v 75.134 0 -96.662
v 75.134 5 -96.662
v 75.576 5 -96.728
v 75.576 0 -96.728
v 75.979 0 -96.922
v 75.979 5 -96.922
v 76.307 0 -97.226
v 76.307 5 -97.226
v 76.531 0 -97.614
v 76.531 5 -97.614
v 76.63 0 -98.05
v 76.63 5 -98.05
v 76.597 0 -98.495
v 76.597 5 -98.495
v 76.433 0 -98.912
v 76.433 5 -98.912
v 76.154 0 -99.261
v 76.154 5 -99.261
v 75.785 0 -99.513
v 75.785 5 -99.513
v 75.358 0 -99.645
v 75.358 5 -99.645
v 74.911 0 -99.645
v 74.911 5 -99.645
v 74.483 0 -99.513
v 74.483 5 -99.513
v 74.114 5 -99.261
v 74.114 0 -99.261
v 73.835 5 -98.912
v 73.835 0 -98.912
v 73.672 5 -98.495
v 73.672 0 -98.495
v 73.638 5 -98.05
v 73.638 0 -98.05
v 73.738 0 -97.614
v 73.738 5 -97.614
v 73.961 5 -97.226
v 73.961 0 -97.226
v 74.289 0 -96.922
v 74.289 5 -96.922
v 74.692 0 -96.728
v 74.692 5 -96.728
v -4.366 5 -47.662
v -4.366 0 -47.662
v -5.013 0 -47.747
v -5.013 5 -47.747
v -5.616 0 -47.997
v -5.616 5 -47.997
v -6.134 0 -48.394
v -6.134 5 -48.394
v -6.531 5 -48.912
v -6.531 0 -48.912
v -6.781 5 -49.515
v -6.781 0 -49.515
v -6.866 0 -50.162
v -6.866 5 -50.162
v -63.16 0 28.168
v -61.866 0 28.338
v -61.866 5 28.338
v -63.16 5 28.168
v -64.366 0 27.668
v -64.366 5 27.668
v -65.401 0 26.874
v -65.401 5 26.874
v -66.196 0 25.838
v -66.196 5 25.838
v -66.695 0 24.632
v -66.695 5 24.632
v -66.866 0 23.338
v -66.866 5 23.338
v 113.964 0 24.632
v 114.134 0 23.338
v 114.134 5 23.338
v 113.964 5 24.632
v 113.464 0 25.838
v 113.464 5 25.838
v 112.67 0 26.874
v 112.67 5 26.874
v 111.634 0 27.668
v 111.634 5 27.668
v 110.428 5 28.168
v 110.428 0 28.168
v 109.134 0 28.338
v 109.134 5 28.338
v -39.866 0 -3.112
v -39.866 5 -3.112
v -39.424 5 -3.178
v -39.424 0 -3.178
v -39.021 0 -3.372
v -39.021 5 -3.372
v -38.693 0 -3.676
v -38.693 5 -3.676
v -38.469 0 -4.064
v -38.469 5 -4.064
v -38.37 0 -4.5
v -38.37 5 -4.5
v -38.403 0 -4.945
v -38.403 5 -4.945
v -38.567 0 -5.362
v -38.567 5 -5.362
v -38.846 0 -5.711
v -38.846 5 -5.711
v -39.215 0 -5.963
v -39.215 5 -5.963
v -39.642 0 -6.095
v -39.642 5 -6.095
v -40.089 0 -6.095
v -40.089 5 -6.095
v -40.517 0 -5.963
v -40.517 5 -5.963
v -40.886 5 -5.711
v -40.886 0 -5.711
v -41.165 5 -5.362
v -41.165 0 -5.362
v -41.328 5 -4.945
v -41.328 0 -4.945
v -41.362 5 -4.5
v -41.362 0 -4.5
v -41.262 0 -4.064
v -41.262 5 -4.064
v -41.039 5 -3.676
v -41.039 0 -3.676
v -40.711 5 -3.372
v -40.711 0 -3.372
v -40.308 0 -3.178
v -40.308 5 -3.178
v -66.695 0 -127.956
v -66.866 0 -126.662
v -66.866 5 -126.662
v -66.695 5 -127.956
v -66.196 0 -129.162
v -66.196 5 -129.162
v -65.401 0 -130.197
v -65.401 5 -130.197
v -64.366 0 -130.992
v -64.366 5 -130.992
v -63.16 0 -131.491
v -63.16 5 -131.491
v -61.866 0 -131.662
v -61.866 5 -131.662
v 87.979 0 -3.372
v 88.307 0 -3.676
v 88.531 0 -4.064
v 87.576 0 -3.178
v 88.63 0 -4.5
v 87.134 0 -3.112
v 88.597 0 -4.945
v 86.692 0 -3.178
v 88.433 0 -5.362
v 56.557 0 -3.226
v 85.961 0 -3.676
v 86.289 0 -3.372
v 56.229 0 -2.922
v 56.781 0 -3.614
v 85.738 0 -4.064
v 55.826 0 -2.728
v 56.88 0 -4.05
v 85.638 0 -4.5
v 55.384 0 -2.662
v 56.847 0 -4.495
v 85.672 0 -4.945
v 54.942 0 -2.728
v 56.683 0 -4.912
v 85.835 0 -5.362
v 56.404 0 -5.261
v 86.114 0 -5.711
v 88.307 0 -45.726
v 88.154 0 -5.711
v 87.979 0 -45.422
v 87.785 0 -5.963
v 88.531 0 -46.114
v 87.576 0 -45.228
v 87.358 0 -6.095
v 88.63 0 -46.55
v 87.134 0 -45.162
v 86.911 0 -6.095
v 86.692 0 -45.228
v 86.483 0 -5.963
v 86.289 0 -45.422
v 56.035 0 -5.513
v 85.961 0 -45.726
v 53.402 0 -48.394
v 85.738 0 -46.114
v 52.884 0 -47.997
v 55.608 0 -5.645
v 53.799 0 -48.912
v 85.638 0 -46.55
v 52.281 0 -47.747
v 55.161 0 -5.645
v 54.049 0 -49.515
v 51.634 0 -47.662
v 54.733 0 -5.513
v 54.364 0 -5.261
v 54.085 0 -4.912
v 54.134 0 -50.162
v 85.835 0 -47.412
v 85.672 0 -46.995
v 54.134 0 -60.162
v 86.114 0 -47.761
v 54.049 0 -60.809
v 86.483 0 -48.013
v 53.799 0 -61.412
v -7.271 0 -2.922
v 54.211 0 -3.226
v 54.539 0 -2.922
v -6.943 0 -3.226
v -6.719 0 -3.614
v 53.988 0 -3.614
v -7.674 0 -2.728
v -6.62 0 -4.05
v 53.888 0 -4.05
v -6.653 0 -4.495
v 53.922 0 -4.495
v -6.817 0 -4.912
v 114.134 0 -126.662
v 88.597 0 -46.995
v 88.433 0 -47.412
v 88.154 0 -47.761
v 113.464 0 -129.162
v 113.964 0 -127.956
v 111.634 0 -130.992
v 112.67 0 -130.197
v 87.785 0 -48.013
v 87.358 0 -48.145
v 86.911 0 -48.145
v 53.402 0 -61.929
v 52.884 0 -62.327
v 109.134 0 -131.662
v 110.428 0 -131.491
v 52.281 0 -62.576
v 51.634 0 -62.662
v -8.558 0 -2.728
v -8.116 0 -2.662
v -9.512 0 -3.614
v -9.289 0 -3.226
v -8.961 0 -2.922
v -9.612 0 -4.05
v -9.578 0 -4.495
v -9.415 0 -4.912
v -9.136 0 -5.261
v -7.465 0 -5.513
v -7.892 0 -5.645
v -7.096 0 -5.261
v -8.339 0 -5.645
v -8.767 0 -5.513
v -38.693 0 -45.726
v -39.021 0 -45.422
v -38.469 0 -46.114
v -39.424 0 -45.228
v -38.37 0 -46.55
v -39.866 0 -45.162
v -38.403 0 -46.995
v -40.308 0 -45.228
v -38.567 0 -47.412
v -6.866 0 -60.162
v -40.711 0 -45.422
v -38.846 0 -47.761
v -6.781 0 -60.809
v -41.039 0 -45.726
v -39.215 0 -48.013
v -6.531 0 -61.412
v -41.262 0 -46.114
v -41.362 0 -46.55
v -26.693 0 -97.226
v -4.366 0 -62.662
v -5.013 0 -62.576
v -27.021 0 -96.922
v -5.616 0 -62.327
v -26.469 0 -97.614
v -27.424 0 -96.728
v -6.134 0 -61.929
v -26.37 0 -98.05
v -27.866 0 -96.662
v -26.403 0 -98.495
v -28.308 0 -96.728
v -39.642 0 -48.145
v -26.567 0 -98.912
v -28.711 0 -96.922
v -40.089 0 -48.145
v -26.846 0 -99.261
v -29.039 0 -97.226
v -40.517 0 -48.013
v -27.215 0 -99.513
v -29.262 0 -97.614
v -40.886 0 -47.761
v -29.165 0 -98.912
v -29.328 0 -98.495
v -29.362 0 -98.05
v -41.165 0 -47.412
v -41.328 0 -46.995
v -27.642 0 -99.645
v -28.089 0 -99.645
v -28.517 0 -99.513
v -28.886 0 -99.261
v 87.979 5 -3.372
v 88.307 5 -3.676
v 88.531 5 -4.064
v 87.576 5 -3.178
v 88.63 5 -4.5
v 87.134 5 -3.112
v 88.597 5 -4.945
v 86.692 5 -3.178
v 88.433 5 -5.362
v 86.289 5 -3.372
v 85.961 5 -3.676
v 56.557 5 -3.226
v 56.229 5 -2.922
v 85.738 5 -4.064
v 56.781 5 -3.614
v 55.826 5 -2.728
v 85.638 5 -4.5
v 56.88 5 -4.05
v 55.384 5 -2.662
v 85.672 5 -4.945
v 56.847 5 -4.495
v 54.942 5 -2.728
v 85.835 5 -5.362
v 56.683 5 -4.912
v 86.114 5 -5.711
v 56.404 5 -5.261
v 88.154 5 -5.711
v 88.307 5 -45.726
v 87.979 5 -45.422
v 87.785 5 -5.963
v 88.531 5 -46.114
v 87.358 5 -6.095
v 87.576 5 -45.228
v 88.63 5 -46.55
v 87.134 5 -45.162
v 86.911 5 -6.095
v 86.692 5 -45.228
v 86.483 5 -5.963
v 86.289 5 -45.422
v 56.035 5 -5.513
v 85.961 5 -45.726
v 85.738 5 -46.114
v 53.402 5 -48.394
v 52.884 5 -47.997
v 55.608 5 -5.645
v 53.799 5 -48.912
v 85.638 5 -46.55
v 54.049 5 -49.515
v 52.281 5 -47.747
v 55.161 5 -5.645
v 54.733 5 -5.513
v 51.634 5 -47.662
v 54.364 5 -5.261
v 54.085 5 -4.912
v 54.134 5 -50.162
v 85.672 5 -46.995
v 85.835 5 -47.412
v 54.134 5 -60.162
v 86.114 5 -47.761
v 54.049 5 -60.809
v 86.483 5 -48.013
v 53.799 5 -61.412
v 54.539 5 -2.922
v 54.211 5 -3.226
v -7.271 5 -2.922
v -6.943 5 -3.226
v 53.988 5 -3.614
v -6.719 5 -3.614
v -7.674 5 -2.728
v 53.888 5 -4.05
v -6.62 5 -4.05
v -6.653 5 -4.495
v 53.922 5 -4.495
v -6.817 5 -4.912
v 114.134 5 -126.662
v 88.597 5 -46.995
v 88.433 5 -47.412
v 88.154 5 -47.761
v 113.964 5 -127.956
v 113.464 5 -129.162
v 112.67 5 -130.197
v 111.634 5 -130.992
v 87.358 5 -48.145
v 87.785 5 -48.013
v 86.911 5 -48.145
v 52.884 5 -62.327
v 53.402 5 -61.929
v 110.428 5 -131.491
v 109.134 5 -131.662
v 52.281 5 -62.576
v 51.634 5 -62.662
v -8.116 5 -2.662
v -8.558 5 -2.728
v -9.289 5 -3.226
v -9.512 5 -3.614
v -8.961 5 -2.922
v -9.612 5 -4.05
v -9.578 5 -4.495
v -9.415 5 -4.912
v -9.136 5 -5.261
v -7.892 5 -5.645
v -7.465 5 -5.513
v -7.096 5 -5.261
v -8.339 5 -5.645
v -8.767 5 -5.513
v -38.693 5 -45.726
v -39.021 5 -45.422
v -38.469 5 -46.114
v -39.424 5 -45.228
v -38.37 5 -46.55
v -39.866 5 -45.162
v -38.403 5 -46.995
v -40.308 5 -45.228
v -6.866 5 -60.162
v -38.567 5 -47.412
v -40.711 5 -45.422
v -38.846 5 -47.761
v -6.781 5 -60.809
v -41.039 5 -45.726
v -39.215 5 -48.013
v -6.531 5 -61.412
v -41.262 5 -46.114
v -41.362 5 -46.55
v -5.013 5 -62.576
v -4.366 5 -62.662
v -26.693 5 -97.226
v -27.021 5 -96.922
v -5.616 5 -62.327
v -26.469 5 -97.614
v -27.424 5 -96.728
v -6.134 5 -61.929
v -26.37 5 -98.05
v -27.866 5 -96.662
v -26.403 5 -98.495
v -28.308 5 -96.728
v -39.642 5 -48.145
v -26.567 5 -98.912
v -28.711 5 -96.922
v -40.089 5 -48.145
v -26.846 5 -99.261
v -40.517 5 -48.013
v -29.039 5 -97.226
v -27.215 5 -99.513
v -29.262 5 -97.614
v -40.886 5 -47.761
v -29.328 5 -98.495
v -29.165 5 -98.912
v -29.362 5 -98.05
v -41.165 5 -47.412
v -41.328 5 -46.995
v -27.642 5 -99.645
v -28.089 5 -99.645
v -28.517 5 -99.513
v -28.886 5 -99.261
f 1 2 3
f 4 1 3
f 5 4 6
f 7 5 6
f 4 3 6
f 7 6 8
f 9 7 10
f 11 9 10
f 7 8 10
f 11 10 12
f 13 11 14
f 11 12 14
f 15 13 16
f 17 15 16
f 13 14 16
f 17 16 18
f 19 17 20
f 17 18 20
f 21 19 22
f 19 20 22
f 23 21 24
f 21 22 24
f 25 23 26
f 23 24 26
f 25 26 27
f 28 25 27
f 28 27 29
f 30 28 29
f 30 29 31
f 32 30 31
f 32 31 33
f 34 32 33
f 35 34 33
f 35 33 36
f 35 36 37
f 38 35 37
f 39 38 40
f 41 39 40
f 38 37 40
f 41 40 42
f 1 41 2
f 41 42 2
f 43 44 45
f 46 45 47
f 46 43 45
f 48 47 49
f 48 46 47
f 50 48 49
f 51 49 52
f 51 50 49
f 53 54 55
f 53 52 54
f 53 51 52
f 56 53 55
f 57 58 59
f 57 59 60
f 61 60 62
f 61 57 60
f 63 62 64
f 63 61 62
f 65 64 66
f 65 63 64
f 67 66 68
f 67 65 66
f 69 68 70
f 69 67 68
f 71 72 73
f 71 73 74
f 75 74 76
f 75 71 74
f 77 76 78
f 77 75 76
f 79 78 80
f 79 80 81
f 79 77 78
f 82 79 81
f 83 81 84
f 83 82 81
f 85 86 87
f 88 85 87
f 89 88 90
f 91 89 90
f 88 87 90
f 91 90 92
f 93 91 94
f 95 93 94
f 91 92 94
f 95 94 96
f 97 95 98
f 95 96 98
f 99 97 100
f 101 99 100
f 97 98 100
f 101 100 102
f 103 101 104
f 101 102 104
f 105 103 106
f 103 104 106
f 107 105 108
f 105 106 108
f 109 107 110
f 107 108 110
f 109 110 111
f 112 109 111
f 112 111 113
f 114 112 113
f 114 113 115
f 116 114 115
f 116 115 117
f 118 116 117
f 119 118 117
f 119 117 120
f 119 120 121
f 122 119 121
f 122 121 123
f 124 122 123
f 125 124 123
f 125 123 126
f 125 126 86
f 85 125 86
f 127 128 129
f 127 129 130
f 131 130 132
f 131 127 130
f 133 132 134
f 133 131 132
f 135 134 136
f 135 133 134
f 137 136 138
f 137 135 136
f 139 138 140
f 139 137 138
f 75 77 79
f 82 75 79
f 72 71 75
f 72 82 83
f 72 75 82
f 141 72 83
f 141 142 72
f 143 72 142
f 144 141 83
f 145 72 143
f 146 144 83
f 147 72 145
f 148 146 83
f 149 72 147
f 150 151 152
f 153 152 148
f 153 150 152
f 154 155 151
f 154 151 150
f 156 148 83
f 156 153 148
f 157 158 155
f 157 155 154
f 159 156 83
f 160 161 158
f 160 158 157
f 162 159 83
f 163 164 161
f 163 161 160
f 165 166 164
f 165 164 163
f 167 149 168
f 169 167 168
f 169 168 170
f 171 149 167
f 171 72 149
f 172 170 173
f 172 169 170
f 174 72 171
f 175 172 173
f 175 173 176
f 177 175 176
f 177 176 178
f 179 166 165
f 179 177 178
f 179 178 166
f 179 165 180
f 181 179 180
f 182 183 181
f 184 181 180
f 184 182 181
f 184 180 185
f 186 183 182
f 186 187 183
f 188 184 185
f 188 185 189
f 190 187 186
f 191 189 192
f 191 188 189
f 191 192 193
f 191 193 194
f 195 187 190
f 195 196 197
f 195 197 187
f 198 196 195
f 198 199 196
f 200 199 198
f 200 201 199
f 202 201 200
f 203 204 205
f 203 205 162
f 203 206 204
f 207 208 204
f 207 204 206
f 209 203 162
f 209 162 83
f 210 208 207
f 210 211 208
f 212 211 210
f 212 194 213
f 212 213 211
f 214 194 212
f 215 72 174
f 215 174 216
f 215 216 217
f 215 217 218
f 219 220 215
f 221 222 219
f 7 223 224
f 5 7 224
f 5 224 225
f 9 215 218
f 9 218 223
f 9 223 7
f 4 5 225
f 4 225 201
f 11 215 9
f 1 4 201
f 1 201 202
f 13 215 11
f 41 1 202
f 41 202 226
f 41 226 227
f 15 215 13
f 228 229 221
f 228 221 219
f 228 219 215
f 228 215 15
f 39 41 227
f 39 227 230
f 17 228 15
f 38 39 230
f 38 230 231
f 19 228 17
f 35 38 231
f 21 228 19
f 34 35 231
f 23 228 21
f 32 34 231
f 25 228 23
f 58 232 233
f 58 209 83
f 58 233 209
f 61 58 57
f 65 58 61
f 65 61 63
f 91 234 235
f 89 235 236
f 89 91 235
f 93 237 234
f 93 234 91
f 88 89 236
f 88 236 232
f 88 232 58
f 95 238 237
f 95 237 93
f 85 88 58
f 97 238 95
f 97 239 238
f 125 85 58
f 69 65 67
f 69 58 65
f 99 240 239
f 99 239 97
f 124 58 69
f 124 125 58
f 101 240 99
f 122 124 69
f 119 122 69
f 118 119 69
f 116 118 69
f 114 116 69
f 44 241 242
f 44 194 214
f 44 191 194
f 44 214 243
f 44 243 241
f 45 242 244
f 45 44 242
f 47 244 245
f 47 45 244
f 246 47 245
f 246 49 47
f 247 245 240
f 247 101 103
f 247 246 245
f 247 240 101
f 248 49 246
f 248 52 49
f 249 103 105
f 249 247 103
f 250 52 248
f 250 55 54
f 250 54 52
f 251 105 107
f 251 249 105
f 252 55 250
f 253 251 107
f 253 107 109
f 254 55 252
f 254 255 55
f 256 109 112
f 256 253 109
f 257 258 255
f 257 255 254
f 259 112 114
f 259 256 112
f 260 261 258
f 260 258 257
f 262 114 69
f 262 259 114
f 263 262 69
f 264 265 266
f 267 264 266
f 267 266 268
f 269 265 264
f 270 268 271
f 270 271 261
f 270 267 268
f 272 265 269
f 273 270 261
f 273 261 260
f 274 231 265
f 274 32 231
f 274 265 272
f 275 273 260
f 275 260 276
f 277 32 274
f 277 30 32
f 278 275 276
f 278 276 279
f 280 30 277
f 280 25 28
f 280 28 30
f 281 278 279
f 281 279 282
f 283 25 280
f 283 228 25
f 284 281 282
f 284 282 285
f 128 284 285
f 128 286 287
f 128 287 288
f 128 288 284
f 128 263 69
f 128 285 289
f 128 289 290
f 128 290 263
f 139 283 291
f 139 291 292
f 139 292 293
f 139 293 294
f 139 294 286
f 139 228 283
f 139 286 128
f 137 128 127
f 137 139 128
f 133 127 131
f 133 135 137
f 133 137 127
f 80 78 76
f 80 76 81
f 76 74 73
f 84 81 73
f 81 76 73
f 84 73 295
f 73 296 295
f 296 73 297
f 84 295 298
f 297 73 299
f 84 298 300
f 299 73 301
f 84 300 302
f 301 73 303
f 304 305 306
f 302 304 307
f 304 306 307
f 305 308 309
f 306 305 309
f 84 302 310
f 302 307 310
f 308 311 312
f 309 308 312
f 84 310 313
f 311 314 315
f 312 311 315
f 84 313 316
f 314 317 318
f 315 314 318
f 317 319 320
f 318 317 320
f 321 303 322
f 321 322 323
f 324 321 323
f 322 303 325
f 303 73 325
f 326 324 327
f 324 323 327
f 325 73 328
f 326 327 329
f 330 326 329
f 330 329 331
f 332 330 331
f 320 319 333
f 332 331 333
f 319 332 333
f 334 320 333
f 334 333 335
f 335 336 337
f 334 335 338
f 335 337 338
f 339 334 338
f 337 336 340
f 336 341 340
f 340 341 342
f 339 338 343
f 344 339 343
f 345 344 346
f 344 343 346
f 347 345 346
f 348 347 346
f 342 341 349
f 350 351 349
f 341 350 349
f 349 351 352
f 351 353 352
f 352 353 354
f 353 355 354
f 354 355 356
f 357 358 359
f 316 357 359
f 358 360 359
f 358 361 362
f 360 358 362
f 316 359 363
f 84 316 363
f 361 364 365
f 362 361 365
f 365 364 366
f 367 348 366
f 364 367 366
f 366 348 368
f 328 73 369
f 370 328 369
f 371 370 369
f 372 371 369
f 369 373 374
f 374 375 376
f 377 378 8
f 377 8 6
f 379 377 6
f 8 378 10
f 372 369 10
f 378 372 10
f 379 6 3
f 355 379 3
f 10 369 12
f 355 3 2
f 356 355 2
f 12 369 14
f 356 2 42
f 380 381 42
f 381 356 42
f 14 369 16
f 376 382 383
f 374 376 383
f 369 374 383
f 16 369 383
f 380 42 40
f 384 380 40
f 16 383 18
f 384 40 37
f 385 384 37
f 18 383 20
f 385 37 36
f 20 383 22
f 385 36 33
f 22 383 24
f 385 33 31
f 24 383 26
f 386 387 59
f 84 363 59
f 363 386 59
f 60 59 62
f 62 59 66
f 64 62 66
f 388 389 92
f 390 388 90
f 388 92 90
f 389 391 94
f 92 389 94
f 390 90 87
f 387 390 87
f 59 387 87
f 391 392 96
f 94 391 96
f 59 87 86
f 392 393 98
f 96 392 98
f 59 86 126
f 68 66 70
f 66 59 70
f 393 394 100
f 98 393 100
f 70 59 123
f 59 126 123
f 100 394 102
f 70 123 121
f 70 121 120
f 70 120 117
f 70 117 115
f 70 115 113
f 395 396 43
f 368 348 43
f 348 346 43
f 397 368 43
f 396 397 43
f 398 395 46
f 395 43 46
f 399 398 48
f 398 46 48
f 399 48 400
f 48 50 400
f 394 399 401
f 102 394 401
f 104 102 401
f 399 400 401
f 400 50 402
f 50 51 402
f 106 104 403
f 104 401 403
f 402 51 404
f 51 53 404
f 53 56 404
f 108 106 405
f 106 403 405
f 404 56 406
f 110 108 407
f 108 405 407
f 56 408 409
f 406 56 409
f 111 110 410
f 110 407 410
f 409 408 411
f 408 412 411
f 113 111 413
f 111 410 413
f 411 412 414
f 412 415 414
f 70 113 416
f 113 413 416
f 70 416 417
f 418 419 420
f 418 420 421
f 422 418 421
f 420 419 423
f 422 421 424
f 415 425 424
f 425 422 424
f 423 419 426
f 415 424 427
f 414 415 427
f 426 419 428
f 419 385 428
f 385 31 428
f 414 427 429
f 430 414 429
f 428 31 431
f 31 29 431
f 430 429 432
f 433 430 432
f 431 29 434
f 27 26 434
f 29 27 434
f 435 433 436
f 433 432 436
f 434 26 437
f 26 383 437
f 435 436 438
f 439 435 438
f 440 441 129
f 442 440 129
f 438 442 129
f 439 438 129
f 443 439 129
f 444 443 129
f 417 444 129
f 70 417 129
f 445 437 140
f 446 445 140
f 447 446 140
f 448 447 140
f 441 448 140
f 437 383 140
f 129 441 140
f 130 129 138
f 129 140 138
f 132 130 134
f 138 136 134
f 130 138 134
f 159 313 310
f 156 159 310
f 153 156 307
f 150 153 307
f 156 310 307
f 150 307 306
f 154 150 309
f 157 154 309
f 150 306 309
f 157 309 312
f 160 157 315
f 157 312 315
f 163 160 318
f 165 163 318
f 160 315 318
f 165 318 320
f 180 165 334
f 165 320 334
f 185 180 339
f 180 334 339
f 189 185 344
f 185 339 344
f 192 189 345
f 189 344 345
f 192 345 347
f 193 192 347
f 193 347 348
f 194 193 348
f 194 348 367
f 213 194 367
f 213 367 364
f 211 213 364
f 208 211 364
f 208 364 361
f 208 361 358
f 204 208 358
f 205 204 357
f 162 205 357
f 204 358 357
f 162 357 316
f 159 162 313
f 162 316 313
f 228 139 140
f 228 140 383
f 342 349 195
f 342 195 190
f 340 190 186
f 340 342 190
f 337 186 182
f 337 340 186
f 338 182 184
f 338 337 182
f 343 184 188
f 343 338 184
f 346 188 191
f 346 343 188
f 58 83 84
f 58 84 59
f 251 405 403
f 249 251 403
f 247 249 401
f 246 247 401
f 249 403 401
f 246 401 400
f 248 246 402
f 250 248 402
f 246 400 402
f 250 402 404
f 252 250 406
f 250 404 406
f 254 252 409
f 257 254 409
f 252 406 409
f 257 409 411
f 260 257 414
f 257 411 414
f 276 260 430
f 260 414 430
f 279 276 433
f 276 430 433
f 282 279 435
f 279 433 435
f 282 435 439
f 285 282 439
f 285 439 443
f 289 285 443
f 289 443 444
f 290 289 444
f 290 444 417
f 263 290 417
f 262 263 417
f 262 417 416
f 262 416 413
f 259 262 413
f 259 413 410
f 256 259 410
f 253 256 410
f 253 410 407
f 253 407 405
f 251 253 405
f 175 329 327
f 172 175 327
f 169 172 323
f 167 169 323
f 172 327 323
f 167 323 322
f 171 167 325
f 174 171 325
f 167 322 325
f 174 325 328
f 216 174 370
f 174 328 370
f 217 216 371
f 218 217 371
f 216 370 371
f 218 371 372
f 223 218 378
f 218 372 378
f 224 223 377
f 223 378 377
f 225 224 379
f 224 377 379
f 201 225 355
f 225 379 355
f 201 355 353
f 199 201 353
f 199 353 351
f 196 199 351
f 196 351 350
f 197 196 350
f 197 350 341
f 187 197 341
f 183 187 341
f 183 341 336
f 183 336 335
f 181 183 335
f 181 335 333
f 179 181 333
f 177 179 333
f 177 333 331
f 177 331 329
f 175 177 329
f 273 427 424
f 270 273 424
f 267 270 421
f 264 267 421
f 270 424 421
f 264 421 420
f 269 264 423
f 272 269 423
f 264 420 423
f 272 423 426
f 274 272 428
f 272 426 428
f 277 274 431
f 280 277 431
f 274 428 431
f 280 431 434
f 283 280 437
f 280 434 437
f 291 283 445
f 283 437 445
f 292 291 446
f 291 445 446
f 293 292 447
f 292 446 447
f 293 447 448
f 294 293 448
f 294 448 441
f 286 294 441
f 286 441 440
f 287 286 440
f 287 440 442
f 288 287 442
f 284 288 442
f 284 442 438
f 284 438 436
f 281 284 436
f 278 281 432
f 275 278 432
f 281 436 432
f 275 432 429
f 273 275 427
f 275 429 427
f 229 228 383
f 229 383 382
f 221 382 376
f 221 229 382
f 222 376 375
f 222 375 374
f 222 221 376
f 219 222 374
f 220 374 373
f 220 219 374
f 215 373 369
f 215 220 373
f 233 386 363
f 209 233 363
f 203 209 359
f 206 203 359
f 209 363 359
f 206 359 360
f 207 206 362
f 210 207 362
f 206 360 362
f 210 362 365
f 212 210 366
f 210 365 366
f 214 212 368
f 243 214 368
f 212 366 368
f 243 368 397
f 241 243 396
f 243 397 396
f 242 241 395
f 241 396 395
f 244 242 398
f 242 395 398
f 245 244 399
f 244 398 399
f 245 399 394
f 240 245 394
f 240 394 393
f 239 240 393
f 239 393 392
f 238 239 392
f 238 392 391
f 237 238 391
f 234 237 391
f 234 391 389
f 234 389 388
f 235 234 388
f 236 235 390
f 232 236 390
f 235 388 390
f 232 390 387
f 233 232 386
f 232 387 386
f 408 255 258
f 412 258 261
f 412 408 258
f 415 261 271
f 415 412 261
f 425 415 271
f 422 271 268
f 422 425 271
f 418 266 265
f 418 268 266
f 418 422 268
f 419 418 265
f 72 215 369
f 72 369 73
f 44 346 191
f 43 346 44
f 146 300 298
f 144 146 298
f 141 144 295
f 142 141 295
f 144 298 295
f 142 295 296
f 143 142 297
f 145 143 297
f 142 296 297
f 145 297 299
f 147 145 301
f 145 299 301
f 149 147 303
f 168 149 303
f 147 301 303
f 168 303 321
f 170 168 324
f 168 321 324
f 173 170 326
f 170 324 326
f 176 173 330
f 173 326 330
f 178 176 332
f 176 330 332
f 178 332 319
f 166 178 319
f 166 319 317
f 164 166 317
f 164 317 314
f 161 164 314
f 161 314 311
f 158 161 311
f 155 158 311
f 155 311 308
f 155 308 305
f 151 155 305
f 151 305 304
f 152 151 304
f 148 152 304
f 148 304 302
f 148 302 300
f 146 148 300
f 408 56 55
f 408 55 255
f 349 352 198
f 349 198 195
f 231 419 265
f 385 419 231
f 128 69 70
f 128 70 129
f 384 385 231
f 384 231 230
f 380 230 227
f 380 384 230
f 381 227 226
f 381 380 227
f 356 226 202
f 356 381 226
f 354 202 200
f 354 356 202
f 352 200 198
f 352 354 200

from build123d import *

# Parameters (mm, degrees)
RESSALTO_EXTRUS_O1_DEPTH = 5
ESBO_O2_R                = 1.5
CORTE_EXTRUS_O1_DEPTH    = 5
ESBO_O3_R                = 1.5
CORTE_EXTRUS_O2_DEPTH    = 10
CORTE_EXTRUS_O3_DEPTH    = 10


with BuildPart() as part:
    # Esboço1 → Ressalto-extrusão1 (new body)
    with BuildSketch(Plane(origin=(0, 0, 0), x_dir=(1, 0, 0), z_dir=(0, 1, 0))):
        with BuildLine():
            Line((-61.865783789, 131.661644013), (109.134216211, 131.661644013))
            ThreePointArc((109.134216211, 131.661644013), (112.669750117, 130.197177919), (114.134216211, 126.661644013))
            Line((114.134216211, 126.661644013), (114.134216211, -23.338355987))
            ThreePointArc((114.134216211, -23.338355987), (112.669750117, -26.873889893), (109.134216211, -28.338355987))
            Line((109.134216211, -28.338355987), (-61.865783789, -28.338355987))
            ThreePointArc((-61.865783789, -28.338355987), (-65.401317695, -26.873889893), (-66.865783789, -23.338355987))
            Line((-66.865783789, -23.338355987), (-66.865783789, 126.661644013))
            ThreePointArc((-66.865783789, 126.661644013), (-65.401317695, 130.197177919), (-61.865783789, 131.661644013))
        make_face()
    extrude(amount=RESSALTO_EXTRUS_O1_DEPTH)

    # Esboço2 → Corte-extrusão1 (cut)
    with BuildSketch(Plane(origin=(0, 5, 0), x_dir=(1, 0, 0), z_dir=(0, 1, 0))):
        with Locations(Location((-27.865783789, 98.161644013, 0), (0, 0, 270))):
            Circle(ESBO_O2_R)
        with Locations(Location((75.134216211, 98.161644013, 0), (0, 0, 270))):
            Circle(ESBO_O2_R)
        with Locations(Location((-8.115783789, 4.161644013, 0), (0, 0, 270))):
            Circle(ESBO_O2_R)
        with Locations(Location((55.384216211, 4.161644013, 0), (0, 0, 270))):
            Circle(ESBO_O2_R)
    extrude(amount=-CORTE_EXTRUS_O1_DEPTH, mode=Mode.SUBTRACT)

    # Esboço3 → Corte-extrusão2 (cut)
    with BuildSketch(Plane(origin=(0, 5, 0), x_dir=(1, 0, 0), z_dir=(0, 1, 0))):
        with Locations(Location((-39.865783789, 46.661644013, 0), (0, 0, 270))):
            Circle(ESBO_O3_R)
        with Locations(Location((-39.865783789, 4.611644013, 0), (0, 0, 270))):
            Circle(ESBO_O3_R)
        with Locations(Location((87.134216211, 46.661644013, 0), (0, 0, 270))):
            Circle(ESBO_O3_R)
        with Locations(Location((87.134216211, 4.611644013, 0), (0, 0, 270))):
            Circle(ESBO_O3_R)
    extrude(amount=-CORTE_EXTRUS_O2_DEPTH, mode=Mode.SUBTRACT)

    # Esboço4 → Corte-extrusão3 (cut)
    with BuildSketch(Plane(origin=(0, 5, 0), x_dir=(1, 0, 0), z_dir=(0, 1, 0))):
        with BuildLine():
            Line((-4.365783789, 62.661644013), (51.634216211, 62.661644013))
            ThreePointArc((51.634216211, 62.661644013), (53.401983164, 61.929410966), (54.134216211, 60.161644013))
            Line((54.134216211, 60.161644013), (54.134216211, 50.161644013))
            ThreePointArc((54.134216211, 50.161644013), (53.401983164, 48.39387706), (51.634216211, 47.661644013))
            Line((51.634216211, 47.661644013), (-4.365783789, 47.661644013))
            ThreePointArc((-4.365783789, 47.661644013), (-6.133550742, 48.39387706), (-6.865783789, 50.161644013))
            Line((-6.865783789, 50.161644013), (-6.865783789, 60.161644013))
            ThreePointArc((-6.865783789, 60.161644013), (-6.133550742, 61.929410966), (-4.365783789, 62.661644013))
        make_face()
    extrude(amount=-CORTE_EXTRUS_O3_DEPTH, mode=Mode.SUBTRACT)


solid = part.part
